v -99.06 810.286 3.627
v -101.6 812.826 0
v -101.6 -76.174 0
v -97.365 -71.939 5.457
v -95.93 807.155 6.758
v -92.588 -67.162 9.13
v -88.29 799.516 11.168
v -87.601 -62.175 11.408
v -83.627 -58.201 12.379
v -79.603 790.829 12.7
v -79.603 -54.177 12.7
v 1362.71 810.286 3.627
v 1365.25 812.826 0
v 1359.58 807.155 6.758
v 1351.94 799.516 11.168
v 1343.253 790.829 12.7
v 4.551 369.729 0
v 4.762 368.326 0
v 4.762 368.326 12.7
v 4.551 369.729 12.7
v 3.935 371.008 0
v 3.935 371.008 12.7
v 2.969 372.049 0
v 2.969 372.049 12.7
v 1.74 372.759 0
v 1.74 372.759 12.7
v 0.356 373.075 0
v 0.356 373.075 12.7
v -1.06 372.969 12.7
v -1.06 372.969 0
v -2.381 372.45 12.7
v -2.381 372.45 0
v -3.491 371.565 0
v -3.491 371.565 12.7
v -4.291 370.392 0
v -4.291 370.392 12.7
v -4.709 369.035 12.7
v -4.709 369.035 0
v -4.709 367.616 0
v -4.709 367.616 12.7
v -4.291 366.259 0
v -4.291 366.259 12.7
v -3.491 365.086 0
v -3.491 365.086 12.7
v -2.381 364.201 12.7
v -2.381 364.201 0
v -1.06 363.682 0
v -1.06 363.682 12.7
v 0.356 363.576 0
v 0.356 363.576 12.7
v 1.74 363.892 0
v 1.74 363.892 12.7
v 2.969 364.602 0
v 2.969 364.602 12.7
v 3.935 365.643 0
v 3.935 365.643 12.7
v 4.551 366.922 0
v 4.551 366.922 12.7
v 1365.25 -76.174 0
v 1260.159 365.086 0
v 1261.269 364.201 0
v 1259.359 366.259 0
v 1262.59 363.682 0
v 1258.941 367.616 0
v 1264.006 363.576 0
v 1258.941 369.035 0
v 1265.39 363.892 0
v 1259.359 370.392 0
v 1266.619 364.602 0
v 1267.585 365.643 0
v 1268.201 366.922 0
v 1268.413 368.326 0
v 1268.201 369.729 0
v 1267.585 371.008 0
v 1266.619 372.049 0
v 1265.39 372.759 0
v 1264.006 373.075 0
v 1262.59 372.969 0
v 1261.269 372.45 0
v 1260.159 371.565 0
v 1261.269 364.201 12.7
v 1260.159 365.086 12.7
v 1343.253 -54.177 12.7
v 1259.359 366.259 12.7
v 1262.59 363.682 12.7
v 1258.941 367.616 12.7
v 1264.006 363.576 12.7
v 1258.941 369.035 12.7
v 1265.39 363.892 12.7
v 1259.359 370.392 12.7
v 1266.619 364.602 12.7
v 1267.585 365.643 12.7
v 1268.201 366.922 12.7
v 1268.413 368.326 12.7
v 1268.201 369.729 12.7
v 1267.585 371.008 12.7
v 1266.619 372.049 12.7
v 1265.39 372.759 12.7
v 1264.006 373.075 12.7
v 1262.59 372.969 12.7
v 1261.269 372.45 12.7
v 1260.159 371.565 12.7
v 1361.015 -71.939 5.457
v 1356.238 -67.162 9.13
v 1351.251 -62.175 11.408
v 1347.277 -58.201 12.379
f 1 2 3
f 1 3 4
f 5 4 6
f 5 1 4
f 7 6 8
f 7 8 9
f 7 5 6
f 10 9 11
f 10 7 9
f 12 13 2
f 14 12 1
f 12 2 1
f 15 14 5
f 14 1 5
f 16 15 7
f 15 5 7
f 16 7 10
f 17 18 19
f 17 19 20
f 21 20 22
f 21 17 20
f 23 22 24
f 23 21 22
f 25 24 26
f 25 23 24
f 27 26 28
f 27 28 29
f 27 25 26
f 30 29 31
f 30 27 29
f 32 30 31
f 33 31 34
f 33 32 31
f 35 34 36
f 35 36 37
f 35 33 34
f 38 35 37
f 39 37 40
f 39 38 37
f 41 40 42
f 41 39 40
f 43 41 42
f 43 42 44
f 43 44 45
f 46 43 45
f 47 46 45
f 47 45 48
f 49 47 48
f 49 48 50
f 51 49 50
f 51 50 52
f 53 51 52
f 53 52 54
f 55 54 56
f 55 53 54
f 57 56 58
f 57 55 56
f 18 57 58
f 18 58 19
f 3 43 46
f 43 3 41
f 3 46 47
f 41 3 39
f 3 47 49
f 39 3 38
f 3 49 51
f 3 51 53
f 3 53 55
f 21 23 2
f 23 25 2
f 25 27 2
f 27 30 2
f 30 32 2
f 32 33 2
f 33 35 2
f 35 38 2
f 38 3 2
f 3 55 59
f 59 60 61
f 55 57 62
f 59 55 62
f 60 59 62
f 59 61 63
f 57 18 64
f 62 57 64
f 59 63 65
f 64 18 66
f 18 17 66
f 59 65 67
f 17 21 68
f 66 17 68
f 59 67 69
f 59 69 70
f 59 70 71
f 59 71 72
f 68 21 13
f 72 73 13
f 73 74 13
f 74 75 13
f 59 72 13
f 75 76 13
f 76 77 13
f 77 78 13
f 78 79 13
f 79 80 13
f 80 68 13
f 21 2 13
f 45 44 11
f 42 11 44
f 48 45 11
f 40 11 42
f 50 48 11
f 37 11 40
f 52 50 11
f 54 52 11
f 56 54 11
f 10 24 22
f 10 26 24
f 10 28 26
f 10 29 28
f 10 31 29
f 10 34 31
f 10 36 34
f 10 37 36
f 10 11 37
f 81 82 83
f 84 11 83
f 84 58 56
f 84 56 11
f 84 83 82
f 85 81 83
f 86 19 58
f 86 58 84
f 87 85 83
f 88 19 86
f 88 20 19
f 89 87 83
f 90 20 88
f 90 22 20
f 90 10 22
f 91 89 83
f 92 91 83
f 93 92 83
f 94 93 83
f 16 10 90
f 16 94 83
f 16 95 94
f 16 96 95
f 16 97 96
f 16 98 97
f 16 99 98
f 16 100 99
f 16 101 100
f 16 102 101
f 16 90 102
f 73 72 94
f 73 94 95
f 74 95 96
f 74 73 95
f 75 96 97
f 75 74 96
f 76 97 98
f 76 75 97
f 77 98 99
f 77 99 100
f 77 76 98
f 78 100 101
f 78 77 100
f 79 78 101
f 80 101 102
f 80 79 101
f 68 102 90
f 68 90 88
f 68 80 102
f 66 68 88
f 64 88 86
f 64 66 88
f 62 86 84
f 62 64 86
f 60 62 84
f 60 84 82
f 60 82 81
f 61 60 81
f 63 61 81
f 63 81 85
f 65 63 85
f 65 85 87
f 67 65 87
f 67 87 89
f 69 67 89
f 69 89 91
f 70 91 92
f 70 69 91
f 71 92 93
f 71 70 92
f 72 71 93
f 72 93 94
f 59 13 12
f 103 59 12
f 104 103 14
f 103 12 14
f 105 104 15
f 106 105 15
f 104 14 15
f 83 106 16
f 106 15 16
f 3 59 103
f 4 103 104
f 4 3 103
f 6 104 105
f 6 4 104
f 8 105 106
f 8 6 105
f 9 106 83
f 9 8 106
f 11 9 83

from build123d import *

# Parameters (mm, degrees)
F0_W        = 1416.05
F0_H        = 838.2
F0_R        = 4.7625
F1_DEPTH    = 12.7
F2_T1_DEPTH = 1576.8352262806
F2_T3_DEPTH = 998.9852262806


# Not quite as in the source:
# - a fillet or chamfer that OpenCascade refuses, or shapes differently, is made with other operations: its cross-section is extruded or revolved along the edge and cut away or added
# - a feature names something its author has since deleted; it is built from what else it names


with BuildPart() as f1:
    # F0 (on Top) → F1 (new body)
    with BuildSketch(Plane.XY):
        Polygon((-101.6, 812.8255558279), (-101.6, -76.1744441721), (1365.25, -76.1744441721), (1365.25, 736.6255558279), (1365.25, 812.8255558279), align=None)
        with Locations((631.825, 368.3255558279)):
            Rectangle(F0_W, F0_H, mode=Mode.SUBTRACT)
        with Locations((631.825, 368.3255558279)):
            Rectangle(F0_W, F0_H)
        with Locations((0, 368.3255558279)):
            Circle(F0_R, mode=Mode.SUBTRACT)
        with Locations((1263.65, 368.3255558279)):
            Circle(F0_R, mode=Mode.SUBTRACT)
    extrude(amount=F1_DEPTH)

    # F2: fillet of radius 25.4 on 4 edges, made by hand

    # F2_s2 → F2_t1 (cut)
    with BuildSketch(Plane.YZ.offset(-156.5926131403)):
        with BuildLine():
            ThreePointArc((-76.1744441721, 0), (-66.8773989159, 9.2970452561), (-54.1773989159, 12.7))
            Line((-54.1773989159, 12.7), (-76.1744441721, 12.7))
            Line((-76.1744441721, 12.7), (-76.1744441721, 0))
        make_face()
        with BuildLine():
            ThreePointArc((812.8255558279, 0), (803.5285105718, 9.2970452561), (790.8285105718, 12.7))
            Line((790.8285105718, 12.7), (812.8255558279, 12.7))
            Line((812.8255558279, 12.7), (812.8255558279, 0))
        make_face()
    extrude(amount=F2_T1_DEPTH, mode=Mode.SUBTRACT)

    # F2_s4 → F2_t3 (cut)
    with BuildSketch(Plane.XZ.offset(-867.8181689683)):
        with BuildLine():
            ThreePointArc((-101.6, 0), (-92.3029547439, 9.2970452561), (-79.6029547439, 12.7))
            Line((-79.6029547439, 12.7), (-101.6, 12.7))
            Line((-101.6, 12.7), (-101.6, 0))
        make_face()
        with BuildLine():
            ThreePointArc((1365.25, 0), (1355.9529547439, 9.2970452561), (1343.2529547439, 12.7))
            Line((1343.2529547439, 12.7), (1365.25, 12.7))
            Line((1365.25, 12.7), (1365.25, 0))
        make_face()
    extrude(amount=F2_T3_DEPTH, mode=Mode.SUBTRACT)


solid = f1.part
